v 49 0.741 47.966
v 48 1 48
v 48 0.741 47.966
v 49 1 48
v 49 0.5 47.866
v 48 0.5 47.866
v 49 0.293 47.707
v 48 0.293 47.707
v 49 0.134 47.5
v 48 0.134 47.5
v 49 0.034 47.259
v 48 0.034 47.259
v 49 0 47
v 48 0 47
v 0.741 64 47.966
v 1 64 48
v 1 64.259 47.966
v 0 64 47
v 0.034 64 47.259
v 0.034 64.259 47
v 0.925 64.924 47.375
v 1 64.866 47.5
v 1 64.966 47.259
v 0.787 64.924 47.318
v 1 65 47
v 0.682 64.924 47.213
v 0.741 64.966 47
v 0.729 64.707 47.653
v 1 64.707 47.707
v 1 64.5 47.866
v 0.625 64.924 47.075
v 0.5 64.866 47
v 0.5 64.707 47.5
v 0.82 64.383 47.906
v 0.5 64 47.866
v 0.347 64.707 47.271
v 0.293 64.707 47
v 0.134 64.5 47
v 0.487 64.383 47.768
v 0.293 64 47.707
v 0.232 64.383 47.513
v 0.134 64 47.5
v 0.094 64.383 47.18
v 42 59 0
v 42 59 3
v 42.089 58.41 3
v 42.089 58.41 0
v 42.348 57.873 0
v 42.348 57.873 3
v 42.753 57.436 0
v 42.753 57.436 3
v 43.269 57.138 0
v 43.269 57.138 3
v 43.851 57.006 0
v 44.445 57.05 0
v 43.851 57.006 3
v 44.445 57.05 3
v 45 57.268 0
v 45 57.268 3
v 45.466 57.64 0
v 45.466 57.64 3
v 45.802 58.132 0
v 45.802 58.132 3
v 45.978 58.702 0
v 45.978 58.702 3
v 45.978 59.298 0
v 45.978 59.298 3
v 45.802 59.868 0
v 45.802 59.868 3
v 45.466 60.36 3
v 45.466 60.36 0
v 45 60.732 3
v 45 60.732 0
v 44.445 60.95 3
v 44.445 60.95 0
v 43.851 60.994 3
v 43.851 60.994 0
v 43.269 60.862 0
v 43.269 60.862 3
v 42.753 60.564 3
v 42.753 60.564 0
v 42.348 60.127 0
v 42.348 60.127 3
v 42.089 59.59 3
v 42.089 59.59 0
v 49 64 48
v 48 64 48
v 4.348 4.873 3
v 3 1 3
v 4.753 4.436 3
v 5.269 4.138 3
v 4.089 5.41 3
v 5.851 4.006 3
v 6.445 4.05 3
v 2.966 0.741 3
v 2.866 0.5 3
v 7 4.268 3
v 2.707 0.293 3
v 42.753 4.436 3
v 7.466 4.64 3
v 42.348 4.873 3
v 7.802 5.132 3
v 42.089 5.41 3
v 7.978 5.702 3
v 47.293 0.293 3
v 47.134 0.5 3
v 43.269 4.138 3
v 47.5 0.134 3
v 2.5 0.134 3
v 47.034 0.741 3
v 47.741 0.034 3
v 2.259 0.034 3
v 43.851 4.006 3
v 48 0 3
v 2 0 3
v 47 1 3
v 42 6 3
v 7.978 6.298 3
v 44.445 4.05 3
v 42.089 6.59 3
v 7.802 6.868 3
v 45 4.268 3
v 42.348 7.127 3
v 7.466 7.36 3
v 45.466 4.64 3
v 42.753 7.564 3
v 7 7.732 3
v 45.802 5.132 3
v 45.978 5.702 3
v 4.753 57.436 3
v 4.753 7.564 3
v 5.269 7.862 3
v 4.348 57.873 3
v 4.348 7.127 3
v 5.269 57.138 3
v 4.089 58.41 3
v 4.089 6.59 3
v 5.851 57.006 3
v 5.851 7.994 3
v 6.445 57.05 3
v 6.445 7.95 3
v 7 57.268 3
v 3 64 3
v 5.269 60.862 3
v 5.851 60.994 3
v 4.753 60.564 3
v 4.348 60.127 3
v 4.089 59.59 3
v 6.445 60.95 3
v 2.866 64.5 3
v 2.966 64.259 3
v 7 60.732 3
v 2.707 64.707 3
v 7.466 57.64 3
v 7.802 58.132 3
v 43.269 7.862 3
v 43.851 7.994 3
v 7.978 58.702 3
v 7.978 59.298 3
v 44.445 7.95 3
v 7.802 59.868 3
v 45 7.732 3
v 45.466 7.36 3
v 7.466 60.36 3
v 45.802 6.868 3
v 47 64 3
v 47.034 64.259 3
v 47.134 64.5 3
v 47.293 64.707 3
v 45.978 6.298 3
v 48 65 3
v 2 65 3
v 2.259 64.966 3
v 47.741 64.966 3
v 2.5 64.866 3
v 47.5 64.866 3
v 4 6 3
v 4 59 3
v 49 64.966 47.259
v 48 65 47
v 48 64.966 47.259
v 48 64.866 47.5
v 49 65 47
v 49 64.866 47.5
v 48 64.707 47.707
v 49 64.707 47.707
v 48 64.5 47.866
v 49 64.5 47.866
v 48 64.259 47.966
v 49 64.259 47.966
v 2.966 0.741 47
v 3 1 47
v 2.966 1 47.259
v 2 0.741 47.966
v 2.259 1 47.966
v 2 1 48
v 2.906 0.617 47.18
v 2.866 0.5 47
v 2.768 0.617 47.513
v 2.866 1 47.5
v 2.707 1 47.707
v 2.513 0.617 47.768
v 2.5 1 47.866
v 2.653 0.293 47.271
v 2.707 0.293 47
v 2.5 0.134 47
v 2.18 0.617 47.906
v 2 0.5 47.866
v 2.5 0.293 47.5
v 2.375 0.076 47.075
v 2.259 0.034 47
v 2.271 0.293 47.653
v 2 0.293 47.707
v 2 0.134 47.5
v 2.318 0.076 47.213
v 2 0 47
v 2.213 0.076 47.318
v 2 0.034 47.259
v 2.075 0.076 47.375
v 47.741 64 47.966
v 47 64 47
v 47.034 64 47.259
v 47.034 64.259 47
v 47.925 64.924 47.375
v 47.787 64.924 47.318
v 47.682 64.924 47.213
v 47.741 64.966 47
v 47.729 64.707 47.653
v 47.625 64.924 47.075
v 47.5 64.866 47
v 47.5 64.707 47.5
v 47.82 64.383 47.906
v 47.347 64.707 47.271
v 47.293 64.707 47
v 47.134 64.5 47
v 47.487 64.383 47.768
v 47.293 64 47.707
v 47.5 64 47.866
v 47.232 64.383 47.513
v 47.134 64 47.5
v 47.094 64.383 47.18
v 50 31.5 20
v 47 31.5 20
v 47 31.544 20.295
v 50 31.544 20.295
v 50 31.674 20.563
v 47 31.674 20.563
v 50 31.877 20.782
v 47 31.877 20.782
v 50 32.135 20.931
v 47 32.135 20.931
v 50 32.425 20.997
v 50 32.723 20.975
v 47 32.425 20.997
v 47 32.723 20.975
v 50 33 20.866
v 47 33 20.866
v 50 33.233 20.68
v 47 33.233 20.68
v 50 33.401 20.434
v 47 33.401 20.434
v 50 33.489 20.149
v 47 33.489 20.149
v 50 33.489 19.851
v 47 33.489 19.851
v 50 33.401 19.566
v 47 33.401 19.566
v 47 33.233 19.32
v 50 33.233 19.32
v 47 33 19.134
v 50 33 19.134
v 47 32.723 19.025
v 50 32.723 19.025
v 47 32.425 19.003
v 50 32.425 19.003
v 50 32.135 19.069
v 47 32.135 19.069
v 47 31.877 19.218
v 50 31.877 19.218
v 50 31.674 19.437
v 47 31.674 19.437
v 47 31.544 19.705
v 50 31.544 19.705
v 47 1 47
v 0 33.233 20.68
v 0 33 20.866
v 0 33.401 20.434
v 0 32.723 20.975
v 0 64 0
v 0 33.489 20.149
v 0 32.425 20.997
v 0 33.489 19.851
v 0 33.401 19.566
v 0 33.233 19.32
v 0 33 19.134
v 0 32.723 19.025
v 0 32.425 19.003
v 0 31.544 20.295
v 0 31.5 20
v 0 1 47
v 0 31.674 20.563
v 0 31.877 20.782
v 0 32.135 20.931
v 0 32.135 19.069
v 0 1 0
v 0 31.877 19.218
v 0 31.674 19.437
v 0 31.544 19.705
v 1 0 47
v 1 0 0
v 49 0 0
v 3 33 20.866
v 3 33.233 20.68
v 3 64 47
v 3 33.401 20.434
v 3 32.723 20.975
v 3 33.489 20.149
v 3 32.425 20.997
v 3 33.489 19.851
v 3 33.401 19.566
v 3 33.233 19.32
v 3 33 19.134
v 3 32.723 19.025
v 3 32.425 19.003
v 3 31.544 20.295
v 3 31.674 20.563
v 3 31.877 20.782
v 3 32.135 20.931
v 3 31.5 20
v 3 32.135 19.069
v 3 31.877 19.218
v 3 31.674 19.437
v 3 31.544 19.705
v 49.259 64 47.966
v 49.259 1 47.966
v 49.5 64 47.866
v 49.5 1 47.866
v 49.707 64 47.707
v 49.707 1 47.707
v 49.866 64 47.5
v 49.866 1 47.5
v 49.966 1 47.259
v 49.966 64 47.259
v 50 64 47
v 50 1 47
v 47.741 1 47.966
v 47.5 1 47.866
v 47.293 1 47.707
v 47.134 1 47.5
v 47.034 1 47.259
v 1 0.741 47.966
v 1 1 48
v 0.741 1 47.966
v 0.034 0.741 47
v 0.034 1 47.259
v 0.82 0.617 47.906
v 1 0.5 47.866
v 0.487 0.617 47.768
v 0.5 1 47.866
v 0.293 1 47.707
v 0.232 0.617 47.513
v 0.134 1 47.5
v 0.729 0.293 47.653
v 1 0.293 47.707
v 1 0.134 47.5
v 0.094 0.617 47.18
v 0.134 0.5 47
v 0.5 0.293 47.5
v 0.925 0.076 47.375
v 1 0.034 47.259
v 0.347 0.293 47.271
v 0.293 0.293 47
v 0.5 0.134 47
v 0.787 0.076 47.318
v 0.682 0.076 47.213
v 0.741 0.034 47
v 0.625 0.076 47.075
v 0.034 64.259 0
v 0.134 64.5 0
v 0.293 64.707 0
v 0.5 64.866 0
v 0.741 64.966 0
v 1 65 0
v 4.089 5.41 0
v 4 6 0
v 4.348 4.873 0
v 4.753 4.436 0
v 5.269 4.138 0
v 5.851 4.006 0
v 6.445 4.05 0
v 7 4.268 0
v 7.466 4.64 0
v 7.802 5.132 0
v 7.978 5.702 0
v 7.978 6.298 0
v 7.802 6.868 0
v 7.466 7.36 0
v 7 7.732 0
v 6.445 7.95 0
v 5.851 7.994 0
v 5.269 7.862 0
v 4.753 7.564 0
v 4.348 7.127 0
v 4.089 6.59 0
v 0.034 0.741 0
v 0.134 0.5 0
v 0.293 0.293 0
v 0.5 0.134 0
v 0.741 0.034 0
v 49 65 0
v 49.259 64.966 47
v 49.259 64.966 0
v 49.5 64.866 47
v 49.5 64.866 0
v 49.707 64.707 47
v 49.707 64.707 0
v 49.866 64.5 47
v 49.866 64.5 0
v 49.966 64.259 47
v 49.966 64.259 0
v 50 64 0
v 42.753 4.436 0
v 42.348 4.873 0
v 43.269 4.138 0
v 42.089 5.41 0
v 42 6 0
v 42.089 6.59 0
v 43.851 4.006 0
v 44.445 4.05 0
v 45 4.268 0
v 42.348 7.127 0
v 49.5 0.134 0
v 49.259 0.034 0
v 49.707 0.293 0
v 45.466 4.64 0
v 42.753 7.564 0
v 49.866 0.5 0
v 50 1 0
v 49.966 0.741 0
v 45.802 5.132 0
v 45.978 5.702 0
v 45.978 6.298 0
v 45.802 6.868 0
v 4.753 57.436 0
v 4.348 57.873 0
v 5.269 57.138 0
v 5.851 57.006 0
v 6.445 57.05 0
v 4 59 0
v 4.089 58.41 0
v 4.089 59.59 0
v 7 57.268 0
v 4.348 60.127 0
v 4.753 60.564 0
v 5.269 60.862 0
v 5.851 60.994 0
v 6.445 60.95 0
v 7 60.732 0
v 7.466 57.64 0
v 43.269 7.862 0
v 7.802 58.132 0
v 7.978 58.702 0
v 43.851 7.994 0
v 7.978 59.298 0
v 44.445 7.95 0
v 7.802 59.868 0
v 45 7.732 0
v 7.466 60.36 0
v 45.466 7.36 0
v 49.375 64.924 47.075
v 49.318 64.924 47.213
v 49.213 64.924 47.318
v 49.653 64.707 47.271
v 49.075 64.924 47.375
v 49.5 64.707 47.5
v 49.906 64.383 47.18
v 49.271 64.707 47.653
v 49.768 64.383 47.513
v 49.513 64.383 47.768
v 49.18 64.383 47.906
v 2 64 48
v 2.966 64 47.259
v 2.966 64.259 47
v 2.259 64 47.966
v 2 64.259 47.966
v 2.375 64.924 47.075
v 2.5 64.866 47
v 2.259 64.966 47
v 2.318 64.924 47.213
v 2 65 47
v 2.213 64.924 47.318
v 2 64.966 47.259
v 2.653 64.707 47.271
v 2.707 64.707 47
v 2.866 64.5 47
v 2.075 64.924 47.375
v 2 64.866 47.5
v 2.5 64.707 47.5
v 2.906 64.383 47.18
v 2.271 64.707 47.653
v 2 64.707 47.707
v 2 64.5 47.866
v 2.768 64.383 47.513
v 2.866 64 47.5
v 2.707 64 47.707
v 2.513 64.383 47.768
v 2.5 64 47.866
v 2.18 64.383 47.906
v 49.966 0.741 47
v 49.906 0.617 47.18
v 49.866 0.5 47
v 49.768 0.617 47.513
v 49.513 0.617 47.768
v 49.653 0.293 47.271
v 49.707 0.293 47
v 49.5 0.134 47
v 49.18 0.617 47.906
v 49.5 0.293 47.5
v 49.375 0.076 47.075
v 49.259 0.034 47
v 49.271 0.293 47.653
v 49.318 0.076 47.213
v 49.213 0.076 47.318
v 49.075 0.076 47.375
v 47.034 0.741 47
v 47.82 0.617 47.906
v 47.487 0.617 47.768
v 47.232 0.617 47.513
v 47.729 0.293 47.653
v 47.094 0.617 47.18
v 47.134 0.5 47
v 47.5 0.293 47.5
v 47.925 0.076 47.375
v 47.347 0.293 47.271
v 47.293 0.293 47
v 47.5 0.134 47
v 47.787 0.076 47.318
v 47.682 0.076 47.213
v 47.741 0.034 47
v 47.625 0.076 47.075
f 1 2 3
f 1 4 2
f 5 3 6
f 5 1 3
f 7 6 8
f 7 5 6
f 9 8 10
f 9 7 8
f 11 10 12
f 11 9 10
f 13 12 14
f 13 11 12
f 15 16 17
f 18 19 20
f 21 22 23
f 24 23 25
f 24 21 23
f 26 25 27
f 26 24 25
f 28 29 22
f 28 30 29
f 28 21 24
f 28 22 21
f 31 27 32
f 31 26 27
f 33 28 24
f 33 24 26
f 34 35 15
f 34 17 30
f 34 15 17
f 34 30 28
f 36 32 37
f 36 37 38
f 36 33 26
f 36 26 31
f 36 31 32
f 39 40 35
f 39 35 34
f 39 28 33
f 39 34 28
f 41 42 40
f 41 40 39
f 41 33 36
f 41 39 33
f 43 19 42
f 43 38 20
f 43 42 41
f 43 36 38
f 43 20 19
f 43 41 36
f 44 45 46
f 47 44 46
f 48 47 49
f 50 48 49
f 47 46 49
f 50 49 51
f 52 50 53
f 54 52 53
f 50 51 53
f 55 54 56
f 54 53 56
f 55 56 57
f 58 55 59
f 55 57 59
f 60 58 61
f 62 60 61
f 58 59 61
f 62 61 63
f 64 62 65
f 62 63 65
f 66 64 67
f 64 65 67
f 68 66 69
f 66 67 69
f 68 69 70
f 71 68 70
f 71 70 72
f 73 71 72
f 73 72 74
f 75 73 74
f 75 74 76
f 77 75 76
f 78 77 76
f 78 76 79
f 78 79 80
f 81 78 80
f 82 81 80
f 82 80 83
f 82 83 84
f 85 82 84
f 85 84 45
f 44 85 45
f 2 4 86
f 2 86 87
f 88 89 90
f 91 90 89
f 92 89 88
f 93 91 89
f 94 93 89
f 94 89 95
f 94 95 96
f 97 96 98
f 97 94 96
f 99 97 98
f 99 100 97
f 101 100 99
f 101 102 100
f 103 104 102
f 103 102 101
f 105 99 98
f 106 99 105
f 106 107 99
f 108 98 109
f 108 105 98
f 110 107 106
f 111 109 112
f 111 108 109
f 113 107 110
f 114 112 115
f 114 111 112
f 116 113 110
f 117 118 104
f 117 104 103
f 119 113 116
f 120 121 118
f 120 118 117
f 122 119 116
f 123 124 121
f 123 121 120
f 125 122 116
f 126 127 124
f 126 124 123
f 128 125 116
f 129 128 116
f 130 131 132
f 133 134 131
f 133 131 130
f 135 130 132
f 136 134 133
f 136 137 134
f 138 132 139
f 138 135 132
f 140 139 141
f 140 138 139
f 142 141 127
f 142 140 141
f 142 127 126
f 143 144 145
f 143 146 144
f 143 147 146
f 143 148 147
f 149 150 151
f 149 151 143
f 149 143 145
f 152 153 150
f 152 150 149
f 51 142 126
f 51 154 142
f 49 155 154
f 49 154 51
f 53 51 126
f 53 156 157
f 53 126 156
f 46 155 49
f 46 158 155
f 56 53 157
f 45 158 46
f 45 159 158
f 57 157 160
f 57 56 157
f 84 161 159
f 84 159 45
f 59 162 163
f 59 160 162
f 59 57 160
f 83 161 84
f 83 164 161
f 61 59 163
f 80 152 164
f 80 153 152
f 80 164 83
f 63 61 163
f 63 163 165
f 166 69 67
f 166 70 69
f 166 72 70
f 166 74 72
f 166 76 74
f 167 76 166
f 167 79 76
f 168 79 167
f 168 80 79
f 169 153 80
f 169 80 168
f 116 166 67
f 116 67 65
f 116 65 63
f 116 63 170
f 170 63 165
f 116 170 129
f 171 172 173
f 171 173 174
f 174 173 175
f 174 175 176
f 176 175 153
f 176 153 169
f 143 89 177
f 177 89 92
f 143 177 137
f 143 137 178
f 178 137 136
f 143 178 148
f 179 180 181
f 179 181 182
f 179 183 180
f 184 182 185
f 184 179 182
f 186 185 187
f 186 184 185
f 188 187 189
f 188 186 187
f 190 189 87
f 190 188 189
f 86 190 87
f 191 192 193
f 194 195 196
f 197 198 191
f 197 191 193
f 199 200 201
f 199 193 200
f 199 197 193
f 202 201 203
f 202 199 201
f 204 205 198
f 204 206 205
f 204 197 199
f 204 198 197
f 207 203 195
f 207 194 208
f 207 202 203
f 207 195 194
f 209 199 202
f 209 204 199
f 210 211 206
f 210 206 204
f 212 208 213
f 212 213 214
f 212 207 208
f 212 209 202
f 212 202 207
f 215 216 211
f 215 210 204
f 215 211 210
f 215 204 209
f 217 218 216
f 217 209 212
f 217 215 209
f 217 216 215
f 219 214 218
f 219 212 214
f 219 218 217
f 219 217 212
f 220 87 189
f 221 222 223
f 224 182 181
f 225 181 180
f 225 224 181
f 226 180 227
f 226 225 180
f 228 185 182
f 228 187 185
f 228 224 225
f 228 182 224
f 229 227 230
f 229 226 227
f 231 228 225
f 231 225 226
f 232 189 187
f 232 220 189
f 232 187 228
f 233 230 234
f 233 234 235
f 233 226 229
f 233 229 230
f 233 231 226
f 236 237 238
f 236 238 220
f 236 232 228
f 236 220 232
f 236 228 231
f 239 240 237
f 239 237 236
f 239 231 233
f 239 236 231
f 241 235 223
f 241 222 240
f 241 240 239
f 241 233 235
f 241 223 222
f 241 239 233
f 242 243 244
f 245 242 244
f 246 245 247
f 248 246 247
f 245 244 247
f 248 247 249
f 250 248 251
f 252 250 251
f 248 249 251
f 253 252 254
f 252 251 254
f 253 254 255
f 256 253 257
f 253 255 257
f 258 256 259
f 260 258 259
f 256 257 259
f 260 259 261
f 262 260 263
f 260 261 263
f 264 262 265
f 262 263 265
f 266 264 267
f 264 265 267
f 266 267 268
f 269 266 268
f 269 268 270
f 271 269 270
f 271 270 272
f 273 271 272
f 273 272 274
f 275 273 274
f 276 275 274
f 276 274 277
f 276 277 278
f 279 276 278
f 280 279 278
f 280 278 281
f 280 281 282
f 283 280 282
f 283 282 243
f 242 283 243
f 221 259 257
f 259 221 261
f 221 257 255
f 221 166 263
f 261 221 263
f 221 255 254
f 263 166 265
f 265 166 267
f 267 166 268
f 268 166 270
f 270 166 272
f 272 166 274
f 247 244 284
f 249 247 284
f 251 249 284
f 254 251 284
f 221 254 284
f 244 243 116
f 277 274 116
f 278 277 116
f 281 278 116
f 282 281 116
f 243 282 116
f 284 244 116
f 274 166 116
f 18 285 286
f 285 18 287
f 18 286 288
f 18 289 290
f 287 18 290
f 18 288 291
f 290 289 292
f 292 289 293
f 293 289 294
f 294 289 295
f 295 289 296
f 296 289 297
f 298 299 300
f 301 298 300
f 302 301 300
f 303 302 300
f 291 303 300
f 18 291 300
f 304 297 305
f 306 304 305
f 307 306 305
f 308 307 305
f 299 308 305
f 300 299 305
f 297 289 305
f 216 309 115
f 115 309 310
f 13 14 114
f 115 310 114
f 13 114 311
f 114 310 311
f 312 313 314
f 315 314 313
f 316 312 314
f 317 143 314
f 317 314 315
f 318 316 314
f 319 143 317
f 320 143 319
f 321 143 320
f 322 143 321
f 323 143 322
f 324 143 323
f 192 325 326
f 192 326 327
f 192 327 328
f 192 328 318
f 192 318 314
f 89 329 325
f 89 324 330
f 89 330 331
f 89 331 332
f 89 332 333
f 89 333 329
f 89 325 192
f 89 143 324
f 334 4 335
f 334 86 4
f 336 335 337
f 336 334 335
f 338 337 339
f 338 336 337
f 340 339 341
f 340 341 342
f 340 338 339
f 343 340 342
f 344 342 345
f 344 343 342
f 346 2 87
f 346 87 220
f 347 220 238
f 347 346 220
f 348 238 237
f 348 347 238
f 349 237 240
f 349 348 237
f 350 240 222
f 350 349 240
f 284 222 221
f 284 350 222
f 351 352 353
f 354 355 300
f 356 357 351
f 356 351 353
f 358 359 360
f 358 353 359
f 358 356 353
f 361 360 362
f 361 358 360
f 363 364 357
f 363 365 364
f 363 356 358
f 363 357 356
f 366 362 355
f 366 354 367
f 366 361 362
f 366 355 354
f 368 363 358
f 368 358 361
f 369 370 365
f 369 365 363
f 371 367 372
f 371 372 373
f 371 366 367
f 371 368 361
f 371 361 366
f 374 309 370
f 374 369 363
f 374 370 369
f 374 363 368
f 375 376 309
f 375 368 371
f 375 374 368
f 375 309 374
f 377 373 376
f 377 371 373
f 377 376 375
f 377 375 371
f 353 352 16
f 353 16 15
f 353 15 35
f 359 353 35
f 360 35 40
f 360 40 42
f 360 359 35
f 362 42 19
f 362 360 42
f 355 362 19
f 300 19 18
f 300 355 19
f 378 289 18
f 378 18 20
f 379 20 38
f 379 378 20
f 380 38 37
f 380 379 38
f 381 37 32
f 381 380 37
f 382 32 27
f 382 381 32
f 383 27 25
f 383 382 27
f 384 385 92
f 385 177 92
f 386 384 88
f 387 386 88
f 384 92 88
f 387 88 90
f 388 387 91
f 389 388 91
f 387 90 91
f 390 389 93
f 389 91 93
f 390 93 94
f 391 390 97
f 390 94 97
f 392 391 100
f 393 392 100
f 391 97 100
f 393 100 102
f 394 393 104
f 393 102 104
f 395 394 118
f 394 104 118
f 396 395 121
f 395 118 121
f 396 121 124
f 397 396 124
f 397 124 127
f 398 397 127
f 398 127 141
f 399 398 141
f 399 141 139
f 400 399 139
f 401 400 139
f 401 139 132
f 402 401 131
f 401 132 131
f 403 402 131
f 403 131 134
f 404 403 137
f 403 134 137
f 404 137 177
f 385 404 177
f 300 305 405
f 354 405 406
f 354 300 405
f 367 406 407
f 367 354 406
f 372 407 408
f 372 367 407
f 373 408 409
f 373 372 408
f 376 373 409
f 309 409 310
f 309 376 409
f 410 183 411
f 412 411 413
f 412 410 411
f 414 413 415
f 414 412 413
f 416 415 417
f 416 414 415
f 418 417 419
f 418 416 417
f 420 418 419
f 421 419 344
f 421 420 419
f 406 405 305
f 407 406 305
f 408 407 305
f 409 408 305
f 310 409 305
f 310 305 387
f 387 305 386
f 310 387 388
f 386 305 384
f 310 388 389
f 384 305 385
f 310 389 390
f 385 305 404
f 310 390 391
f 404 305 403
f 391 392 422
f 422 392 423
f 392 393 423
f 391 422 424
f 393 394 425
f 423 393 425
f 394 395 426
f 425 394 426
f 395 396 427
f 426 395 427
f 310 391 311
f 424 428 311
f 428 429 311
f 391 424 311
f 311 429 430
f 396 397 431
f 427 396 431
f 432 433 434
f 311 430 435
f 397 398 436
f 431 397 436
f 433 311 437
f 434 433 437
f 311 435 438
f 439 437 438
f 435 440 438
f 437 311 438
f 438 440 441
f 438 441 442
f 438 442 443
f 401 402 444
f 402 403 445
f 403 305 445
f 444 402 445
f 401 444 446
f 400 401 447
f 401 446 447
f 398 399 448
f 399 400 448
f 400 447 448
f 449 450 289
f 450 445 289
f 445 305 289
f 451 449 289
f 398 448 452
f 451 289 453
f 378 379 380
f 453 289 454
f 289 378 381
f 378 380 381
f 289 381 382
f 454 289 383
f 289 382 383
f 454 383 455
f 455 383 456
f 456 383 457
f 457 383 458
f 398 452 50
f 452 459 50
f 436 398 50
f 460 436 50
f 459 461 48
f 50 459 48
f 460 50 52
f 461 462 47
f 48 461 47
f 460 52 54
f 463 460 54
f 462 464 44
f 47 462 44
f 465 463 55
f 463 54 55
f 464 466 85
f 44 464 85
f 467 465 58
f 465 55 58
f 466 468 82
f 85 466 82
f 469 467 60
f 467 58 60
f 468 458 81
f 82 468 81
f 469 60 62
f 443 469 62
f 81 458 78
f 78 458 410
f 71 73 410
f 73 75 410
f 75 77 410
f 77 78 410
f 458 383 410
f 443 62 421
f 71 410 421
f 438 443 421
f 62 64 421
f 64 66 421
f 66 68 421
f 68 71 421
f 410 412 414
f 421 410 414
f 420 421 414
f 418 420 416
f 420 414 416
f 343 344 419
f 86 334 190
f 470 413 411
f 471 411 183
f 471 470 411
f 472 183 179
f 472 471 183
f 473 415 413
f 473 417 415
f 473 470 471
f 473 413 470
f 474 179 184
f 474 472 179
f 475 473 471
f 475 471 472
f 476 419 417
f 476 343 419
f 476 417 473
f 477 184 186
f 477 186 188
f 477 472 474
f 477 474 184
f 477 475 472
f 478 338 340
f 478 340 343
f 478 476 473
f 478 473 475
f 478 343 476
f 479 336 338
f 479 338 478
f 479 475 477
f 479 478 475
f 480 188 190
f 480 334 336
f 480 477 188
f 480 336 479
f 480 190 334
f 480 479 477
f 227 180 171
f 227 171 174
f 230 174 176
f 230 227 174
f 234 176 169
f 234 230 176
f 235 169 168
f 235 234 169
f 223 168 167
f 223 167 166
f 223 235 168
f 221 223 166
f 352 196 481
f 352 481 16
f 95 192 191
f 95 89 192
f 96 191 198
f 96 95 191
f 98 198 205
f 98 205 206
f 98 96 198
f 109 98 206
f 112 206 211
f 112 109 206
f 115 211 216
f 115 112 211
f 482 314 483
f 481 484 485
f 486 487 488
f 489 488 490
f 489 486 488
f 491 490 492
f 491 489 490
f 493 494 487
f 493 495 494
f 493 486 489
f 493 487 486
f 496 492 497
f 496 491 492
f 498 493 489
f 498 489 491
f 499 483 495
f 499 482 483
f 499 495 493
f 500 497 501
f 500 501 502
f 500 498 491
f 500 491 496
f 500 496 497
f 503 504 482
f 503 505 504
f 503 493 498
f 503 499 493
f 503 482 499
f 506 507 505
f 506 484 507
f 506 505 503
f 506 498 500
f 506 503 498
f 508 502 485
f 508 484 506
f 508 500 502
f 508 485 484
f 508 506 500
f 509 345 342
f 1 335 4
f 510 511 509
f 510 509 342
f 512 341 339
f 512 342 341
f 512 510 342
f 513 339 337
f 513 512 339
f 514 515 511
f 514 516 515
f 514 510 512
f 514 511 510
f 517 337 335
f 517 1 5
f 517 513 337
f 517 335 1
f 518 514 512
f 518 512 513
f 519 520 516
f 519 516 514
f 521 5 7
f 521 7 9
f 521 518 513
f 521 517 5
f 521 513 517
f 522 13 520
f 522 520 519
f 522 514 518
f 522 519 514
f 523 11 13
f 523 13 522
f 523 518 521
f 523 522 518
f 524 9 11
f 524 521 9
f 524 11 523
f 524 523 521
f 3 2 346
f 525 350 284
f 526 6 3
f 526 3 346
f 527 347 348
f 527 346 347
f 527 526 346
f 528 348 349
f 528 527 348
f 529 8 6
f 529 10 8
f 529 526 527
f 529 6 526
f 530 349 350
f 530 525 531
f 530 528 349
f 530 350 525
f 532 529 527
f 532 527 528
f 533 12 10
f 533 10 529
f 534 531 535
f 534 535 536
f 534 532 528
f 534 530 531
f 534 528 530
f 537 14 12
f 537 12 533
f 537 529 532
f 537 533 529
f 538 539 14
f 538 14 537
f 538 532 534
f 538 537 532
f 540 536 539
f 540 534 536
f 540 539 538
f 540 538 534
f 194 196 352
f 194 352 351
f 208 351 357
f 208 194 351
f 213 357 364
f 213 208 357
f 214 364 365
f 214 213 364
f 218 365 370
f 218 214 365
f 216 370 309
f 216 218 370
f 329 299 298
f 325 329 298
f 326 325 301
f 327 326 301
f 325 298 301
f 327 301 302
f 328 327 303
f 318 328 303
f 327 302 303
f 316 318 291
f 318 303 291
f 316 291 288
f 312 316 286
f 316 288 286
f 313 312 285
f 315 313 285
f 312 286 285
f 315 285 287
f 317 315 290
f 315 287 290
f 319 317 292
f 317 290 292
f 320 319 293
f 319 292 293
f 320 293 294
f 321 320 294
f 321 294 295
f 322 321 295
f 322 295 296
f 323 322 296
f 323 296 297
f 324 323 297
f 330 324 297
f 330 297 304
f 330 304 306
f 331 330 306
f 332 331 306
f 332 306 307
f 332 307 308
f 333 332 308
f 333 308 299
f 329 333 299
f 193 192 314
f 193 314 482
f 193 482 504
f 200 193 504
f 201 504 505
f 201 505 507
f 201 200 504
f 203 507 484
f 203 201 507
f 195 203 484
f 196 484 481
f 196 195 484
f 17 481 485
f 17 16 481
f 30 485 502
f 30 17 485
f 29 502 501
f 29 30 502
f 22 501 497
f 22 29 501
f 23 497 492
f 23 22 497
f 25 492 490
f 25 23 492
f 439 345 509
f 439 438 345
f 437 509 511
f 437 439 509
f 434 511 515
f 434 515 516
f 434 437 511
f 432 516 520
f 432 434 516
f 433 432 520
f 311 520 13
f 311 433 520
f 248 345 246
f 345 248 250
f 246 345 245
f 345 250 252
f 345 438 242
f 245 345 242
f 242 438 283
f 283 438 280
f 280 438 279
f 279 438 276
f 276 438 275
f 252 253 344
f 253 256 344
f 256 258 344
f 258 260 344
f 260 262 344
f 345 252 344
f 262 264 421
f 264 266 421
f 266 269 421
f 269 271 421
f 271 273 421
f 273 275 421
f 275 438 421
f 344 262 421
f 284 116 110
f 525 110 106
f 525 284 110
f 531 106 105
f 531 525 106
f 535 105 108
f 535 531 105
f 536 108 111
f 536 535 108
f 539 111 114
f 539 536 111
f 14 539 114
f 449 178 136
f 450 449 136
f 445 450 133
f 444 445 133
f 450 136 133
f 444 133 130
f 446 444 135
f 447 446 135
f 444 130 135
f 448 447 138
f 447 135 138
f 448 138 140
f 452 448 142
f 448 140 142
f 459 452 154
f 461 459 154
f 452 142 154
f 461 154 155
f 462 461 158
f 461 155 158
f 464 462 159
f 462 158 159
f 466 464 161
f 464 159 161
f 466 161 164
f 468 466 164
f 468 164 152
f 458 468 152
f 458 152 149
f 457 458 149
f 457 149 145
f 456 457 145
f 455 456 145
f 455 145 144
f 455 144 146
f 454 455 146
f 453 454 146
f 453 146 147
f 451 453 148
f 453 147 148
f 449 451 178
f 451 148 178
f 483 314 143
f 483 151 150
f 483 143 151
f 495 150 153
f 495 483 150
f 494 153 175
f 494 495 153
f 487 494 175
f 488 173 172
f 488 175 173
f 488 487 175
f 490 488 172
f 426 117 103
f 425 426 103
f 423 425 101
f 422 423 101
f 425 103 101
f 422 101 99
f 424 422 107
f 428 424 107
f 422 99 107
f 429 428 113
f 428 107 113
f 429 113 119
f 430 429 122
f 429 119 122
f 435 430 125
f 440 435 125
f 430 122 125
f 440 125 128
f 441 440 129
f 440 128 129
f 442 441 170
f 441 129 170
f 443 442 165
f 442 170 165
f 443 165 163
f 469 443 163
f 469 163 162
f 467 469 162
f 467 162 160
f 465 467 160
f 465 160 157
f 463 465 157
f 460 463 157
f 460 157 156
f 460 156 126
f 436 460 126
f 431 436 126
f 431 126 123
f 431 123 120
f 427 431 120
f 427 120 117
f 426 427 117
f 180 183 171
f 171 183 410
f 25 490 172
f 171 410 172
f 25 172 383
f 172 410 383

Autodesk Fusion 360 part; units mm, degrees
sketch "Sketch1" plane through (0, 0, 0) normal (0, 0, 1) x (1, 0, 0)
  line L0 (0, 0) -> (50, 0)
  line L1 (50, 0) -> (50, 65)
  line L2 (50, 65) -> (0, 65)
  line L3 (0, 65) -> (0, 0)
  dimension "d1" = 50
  dimension "d2" = 65
extrude "Extrude1" add sketch "Sketch1" along normal blind 3
sketch "Sketch2" plane through (0, 0, 3) normal (0, 0, 1) x (-1, 0, 0)
  line L0 (0, -65) -> (0, 0)
  line L1 (0, 0) -> (-50, 0)
  line L2 (-50, 0) -> (-50, -65)
  line L3 (-50, -65) -> (0, -65)
  line L4 (0, -65) -> (-3, -65)
  line L5 (-3, -65) -> (-3, 0)
  line L6 (-3, 0) -> (0, 0)
  line L7 (0, 0) -> (0, -65)
  dimension "d5" = 65
  dimension "d6" = 50
  dimension "d7" = 3
extrude "Extrude2" add sketch "Sketch2" along normal blind 45 contours L0 L1 L3 L4 L5 L6 L7
sketch "Sketch3" plane through (0, 0, 3) normal (0, 0, 1) x (-1, 0, 0)
  line L0 (-3, -65) -> (-3, 0)
  line L1 (-3, 0) -> (-50, 0)
  line L2 (-50, 0) -> (-50, -65)
  line L3 (-50, -65) -> (-3, -65)
  line L4 (-50, -65) -> (-47, -65)
  line L5 (-47, -65) -> (-47, 0)
  line L6 (-47, 0) -> (-50, 0)
  line L7 (-50, 0) -> (-50, -65)
  dimension "d10" = 3
extrude "Extrude3" add sketch "Sketch3" along normal blind 45 contours L1 L2 L3 L4 L5 L6 L7
sketch "Sketch4" plane through (0, 0, 0) normal (-1, 0, 0) x (0, -1, 0)
  line L0 (-65, 0) -> (0, 0)
  line L1 (0, 0) -> (0, 48)
  line L2 (0, 48) -> (-65, 48)
  line L3 (-65, 48) -> (-65, 0)
  circle A0 centre (-32.5, 20) radius 1
  dimension "d14" = 2
extrude "Extrude4" cut sketch "Sketch4" against normal blind 51 contours A0
sketch "Sketch5" plane through (0, 0, 3) normal (0, 0, 1) x (-1, 0, 0)
  line L0 (-47, 0) -> (-47, -65)
  line L1 (-47, -65) -> (-3, -65)
  line L2 (-3, -65) -> (-3, 0)
  line L3 (-3, 0) -> (-47, 0)
  line L4 (0, 0) -> (-3, 0)
  circle A0 centre (-6, -59) radius 2
  circle A1 centre (-6, -6) radius 2
  circle A2 centre (-44, -6) radius 2
  circle A3 centre (-44, -59) radius 2
  dimension "d21" = 4
  dimension "d22" = 4
  dimension "d25" = 4
  dimension "d28" = 4
extrude "Extrude5" cut sketch "Sketch5" against normal blind 5 contours A0 | A1 | A2 | A3
fillet "Fillet1" radius 1 4 edges at (50, 32.5, 48) (47, 32.5, 48) (3, 32.5, 48) (0, 32.5, 48)
fillet "Fillet2" radius 1 20 edges at (0, 65, 23.5) (0.2929, 65, 47.7071) (1.5, 65, 48) (2.7071, 65, 47.7071) (3, 65, 25) (47, 65, 25) (47.2929, 65, 47.7071) (48.5, 65, 48) (49.7071, 65, 47.7071) (50, 65, 23.5) (0, 0, 23.5) (0.2929, 0, 47.7071) (1.5, 0, 48) (2.7071, 0, 47.7071) (3, 0, 25) (47, 0, 25) (47.2929, 0, 47.7071) (48.5, 0, 48) (49.7071, 0, 47.7071) (50, 0, 23.5)
